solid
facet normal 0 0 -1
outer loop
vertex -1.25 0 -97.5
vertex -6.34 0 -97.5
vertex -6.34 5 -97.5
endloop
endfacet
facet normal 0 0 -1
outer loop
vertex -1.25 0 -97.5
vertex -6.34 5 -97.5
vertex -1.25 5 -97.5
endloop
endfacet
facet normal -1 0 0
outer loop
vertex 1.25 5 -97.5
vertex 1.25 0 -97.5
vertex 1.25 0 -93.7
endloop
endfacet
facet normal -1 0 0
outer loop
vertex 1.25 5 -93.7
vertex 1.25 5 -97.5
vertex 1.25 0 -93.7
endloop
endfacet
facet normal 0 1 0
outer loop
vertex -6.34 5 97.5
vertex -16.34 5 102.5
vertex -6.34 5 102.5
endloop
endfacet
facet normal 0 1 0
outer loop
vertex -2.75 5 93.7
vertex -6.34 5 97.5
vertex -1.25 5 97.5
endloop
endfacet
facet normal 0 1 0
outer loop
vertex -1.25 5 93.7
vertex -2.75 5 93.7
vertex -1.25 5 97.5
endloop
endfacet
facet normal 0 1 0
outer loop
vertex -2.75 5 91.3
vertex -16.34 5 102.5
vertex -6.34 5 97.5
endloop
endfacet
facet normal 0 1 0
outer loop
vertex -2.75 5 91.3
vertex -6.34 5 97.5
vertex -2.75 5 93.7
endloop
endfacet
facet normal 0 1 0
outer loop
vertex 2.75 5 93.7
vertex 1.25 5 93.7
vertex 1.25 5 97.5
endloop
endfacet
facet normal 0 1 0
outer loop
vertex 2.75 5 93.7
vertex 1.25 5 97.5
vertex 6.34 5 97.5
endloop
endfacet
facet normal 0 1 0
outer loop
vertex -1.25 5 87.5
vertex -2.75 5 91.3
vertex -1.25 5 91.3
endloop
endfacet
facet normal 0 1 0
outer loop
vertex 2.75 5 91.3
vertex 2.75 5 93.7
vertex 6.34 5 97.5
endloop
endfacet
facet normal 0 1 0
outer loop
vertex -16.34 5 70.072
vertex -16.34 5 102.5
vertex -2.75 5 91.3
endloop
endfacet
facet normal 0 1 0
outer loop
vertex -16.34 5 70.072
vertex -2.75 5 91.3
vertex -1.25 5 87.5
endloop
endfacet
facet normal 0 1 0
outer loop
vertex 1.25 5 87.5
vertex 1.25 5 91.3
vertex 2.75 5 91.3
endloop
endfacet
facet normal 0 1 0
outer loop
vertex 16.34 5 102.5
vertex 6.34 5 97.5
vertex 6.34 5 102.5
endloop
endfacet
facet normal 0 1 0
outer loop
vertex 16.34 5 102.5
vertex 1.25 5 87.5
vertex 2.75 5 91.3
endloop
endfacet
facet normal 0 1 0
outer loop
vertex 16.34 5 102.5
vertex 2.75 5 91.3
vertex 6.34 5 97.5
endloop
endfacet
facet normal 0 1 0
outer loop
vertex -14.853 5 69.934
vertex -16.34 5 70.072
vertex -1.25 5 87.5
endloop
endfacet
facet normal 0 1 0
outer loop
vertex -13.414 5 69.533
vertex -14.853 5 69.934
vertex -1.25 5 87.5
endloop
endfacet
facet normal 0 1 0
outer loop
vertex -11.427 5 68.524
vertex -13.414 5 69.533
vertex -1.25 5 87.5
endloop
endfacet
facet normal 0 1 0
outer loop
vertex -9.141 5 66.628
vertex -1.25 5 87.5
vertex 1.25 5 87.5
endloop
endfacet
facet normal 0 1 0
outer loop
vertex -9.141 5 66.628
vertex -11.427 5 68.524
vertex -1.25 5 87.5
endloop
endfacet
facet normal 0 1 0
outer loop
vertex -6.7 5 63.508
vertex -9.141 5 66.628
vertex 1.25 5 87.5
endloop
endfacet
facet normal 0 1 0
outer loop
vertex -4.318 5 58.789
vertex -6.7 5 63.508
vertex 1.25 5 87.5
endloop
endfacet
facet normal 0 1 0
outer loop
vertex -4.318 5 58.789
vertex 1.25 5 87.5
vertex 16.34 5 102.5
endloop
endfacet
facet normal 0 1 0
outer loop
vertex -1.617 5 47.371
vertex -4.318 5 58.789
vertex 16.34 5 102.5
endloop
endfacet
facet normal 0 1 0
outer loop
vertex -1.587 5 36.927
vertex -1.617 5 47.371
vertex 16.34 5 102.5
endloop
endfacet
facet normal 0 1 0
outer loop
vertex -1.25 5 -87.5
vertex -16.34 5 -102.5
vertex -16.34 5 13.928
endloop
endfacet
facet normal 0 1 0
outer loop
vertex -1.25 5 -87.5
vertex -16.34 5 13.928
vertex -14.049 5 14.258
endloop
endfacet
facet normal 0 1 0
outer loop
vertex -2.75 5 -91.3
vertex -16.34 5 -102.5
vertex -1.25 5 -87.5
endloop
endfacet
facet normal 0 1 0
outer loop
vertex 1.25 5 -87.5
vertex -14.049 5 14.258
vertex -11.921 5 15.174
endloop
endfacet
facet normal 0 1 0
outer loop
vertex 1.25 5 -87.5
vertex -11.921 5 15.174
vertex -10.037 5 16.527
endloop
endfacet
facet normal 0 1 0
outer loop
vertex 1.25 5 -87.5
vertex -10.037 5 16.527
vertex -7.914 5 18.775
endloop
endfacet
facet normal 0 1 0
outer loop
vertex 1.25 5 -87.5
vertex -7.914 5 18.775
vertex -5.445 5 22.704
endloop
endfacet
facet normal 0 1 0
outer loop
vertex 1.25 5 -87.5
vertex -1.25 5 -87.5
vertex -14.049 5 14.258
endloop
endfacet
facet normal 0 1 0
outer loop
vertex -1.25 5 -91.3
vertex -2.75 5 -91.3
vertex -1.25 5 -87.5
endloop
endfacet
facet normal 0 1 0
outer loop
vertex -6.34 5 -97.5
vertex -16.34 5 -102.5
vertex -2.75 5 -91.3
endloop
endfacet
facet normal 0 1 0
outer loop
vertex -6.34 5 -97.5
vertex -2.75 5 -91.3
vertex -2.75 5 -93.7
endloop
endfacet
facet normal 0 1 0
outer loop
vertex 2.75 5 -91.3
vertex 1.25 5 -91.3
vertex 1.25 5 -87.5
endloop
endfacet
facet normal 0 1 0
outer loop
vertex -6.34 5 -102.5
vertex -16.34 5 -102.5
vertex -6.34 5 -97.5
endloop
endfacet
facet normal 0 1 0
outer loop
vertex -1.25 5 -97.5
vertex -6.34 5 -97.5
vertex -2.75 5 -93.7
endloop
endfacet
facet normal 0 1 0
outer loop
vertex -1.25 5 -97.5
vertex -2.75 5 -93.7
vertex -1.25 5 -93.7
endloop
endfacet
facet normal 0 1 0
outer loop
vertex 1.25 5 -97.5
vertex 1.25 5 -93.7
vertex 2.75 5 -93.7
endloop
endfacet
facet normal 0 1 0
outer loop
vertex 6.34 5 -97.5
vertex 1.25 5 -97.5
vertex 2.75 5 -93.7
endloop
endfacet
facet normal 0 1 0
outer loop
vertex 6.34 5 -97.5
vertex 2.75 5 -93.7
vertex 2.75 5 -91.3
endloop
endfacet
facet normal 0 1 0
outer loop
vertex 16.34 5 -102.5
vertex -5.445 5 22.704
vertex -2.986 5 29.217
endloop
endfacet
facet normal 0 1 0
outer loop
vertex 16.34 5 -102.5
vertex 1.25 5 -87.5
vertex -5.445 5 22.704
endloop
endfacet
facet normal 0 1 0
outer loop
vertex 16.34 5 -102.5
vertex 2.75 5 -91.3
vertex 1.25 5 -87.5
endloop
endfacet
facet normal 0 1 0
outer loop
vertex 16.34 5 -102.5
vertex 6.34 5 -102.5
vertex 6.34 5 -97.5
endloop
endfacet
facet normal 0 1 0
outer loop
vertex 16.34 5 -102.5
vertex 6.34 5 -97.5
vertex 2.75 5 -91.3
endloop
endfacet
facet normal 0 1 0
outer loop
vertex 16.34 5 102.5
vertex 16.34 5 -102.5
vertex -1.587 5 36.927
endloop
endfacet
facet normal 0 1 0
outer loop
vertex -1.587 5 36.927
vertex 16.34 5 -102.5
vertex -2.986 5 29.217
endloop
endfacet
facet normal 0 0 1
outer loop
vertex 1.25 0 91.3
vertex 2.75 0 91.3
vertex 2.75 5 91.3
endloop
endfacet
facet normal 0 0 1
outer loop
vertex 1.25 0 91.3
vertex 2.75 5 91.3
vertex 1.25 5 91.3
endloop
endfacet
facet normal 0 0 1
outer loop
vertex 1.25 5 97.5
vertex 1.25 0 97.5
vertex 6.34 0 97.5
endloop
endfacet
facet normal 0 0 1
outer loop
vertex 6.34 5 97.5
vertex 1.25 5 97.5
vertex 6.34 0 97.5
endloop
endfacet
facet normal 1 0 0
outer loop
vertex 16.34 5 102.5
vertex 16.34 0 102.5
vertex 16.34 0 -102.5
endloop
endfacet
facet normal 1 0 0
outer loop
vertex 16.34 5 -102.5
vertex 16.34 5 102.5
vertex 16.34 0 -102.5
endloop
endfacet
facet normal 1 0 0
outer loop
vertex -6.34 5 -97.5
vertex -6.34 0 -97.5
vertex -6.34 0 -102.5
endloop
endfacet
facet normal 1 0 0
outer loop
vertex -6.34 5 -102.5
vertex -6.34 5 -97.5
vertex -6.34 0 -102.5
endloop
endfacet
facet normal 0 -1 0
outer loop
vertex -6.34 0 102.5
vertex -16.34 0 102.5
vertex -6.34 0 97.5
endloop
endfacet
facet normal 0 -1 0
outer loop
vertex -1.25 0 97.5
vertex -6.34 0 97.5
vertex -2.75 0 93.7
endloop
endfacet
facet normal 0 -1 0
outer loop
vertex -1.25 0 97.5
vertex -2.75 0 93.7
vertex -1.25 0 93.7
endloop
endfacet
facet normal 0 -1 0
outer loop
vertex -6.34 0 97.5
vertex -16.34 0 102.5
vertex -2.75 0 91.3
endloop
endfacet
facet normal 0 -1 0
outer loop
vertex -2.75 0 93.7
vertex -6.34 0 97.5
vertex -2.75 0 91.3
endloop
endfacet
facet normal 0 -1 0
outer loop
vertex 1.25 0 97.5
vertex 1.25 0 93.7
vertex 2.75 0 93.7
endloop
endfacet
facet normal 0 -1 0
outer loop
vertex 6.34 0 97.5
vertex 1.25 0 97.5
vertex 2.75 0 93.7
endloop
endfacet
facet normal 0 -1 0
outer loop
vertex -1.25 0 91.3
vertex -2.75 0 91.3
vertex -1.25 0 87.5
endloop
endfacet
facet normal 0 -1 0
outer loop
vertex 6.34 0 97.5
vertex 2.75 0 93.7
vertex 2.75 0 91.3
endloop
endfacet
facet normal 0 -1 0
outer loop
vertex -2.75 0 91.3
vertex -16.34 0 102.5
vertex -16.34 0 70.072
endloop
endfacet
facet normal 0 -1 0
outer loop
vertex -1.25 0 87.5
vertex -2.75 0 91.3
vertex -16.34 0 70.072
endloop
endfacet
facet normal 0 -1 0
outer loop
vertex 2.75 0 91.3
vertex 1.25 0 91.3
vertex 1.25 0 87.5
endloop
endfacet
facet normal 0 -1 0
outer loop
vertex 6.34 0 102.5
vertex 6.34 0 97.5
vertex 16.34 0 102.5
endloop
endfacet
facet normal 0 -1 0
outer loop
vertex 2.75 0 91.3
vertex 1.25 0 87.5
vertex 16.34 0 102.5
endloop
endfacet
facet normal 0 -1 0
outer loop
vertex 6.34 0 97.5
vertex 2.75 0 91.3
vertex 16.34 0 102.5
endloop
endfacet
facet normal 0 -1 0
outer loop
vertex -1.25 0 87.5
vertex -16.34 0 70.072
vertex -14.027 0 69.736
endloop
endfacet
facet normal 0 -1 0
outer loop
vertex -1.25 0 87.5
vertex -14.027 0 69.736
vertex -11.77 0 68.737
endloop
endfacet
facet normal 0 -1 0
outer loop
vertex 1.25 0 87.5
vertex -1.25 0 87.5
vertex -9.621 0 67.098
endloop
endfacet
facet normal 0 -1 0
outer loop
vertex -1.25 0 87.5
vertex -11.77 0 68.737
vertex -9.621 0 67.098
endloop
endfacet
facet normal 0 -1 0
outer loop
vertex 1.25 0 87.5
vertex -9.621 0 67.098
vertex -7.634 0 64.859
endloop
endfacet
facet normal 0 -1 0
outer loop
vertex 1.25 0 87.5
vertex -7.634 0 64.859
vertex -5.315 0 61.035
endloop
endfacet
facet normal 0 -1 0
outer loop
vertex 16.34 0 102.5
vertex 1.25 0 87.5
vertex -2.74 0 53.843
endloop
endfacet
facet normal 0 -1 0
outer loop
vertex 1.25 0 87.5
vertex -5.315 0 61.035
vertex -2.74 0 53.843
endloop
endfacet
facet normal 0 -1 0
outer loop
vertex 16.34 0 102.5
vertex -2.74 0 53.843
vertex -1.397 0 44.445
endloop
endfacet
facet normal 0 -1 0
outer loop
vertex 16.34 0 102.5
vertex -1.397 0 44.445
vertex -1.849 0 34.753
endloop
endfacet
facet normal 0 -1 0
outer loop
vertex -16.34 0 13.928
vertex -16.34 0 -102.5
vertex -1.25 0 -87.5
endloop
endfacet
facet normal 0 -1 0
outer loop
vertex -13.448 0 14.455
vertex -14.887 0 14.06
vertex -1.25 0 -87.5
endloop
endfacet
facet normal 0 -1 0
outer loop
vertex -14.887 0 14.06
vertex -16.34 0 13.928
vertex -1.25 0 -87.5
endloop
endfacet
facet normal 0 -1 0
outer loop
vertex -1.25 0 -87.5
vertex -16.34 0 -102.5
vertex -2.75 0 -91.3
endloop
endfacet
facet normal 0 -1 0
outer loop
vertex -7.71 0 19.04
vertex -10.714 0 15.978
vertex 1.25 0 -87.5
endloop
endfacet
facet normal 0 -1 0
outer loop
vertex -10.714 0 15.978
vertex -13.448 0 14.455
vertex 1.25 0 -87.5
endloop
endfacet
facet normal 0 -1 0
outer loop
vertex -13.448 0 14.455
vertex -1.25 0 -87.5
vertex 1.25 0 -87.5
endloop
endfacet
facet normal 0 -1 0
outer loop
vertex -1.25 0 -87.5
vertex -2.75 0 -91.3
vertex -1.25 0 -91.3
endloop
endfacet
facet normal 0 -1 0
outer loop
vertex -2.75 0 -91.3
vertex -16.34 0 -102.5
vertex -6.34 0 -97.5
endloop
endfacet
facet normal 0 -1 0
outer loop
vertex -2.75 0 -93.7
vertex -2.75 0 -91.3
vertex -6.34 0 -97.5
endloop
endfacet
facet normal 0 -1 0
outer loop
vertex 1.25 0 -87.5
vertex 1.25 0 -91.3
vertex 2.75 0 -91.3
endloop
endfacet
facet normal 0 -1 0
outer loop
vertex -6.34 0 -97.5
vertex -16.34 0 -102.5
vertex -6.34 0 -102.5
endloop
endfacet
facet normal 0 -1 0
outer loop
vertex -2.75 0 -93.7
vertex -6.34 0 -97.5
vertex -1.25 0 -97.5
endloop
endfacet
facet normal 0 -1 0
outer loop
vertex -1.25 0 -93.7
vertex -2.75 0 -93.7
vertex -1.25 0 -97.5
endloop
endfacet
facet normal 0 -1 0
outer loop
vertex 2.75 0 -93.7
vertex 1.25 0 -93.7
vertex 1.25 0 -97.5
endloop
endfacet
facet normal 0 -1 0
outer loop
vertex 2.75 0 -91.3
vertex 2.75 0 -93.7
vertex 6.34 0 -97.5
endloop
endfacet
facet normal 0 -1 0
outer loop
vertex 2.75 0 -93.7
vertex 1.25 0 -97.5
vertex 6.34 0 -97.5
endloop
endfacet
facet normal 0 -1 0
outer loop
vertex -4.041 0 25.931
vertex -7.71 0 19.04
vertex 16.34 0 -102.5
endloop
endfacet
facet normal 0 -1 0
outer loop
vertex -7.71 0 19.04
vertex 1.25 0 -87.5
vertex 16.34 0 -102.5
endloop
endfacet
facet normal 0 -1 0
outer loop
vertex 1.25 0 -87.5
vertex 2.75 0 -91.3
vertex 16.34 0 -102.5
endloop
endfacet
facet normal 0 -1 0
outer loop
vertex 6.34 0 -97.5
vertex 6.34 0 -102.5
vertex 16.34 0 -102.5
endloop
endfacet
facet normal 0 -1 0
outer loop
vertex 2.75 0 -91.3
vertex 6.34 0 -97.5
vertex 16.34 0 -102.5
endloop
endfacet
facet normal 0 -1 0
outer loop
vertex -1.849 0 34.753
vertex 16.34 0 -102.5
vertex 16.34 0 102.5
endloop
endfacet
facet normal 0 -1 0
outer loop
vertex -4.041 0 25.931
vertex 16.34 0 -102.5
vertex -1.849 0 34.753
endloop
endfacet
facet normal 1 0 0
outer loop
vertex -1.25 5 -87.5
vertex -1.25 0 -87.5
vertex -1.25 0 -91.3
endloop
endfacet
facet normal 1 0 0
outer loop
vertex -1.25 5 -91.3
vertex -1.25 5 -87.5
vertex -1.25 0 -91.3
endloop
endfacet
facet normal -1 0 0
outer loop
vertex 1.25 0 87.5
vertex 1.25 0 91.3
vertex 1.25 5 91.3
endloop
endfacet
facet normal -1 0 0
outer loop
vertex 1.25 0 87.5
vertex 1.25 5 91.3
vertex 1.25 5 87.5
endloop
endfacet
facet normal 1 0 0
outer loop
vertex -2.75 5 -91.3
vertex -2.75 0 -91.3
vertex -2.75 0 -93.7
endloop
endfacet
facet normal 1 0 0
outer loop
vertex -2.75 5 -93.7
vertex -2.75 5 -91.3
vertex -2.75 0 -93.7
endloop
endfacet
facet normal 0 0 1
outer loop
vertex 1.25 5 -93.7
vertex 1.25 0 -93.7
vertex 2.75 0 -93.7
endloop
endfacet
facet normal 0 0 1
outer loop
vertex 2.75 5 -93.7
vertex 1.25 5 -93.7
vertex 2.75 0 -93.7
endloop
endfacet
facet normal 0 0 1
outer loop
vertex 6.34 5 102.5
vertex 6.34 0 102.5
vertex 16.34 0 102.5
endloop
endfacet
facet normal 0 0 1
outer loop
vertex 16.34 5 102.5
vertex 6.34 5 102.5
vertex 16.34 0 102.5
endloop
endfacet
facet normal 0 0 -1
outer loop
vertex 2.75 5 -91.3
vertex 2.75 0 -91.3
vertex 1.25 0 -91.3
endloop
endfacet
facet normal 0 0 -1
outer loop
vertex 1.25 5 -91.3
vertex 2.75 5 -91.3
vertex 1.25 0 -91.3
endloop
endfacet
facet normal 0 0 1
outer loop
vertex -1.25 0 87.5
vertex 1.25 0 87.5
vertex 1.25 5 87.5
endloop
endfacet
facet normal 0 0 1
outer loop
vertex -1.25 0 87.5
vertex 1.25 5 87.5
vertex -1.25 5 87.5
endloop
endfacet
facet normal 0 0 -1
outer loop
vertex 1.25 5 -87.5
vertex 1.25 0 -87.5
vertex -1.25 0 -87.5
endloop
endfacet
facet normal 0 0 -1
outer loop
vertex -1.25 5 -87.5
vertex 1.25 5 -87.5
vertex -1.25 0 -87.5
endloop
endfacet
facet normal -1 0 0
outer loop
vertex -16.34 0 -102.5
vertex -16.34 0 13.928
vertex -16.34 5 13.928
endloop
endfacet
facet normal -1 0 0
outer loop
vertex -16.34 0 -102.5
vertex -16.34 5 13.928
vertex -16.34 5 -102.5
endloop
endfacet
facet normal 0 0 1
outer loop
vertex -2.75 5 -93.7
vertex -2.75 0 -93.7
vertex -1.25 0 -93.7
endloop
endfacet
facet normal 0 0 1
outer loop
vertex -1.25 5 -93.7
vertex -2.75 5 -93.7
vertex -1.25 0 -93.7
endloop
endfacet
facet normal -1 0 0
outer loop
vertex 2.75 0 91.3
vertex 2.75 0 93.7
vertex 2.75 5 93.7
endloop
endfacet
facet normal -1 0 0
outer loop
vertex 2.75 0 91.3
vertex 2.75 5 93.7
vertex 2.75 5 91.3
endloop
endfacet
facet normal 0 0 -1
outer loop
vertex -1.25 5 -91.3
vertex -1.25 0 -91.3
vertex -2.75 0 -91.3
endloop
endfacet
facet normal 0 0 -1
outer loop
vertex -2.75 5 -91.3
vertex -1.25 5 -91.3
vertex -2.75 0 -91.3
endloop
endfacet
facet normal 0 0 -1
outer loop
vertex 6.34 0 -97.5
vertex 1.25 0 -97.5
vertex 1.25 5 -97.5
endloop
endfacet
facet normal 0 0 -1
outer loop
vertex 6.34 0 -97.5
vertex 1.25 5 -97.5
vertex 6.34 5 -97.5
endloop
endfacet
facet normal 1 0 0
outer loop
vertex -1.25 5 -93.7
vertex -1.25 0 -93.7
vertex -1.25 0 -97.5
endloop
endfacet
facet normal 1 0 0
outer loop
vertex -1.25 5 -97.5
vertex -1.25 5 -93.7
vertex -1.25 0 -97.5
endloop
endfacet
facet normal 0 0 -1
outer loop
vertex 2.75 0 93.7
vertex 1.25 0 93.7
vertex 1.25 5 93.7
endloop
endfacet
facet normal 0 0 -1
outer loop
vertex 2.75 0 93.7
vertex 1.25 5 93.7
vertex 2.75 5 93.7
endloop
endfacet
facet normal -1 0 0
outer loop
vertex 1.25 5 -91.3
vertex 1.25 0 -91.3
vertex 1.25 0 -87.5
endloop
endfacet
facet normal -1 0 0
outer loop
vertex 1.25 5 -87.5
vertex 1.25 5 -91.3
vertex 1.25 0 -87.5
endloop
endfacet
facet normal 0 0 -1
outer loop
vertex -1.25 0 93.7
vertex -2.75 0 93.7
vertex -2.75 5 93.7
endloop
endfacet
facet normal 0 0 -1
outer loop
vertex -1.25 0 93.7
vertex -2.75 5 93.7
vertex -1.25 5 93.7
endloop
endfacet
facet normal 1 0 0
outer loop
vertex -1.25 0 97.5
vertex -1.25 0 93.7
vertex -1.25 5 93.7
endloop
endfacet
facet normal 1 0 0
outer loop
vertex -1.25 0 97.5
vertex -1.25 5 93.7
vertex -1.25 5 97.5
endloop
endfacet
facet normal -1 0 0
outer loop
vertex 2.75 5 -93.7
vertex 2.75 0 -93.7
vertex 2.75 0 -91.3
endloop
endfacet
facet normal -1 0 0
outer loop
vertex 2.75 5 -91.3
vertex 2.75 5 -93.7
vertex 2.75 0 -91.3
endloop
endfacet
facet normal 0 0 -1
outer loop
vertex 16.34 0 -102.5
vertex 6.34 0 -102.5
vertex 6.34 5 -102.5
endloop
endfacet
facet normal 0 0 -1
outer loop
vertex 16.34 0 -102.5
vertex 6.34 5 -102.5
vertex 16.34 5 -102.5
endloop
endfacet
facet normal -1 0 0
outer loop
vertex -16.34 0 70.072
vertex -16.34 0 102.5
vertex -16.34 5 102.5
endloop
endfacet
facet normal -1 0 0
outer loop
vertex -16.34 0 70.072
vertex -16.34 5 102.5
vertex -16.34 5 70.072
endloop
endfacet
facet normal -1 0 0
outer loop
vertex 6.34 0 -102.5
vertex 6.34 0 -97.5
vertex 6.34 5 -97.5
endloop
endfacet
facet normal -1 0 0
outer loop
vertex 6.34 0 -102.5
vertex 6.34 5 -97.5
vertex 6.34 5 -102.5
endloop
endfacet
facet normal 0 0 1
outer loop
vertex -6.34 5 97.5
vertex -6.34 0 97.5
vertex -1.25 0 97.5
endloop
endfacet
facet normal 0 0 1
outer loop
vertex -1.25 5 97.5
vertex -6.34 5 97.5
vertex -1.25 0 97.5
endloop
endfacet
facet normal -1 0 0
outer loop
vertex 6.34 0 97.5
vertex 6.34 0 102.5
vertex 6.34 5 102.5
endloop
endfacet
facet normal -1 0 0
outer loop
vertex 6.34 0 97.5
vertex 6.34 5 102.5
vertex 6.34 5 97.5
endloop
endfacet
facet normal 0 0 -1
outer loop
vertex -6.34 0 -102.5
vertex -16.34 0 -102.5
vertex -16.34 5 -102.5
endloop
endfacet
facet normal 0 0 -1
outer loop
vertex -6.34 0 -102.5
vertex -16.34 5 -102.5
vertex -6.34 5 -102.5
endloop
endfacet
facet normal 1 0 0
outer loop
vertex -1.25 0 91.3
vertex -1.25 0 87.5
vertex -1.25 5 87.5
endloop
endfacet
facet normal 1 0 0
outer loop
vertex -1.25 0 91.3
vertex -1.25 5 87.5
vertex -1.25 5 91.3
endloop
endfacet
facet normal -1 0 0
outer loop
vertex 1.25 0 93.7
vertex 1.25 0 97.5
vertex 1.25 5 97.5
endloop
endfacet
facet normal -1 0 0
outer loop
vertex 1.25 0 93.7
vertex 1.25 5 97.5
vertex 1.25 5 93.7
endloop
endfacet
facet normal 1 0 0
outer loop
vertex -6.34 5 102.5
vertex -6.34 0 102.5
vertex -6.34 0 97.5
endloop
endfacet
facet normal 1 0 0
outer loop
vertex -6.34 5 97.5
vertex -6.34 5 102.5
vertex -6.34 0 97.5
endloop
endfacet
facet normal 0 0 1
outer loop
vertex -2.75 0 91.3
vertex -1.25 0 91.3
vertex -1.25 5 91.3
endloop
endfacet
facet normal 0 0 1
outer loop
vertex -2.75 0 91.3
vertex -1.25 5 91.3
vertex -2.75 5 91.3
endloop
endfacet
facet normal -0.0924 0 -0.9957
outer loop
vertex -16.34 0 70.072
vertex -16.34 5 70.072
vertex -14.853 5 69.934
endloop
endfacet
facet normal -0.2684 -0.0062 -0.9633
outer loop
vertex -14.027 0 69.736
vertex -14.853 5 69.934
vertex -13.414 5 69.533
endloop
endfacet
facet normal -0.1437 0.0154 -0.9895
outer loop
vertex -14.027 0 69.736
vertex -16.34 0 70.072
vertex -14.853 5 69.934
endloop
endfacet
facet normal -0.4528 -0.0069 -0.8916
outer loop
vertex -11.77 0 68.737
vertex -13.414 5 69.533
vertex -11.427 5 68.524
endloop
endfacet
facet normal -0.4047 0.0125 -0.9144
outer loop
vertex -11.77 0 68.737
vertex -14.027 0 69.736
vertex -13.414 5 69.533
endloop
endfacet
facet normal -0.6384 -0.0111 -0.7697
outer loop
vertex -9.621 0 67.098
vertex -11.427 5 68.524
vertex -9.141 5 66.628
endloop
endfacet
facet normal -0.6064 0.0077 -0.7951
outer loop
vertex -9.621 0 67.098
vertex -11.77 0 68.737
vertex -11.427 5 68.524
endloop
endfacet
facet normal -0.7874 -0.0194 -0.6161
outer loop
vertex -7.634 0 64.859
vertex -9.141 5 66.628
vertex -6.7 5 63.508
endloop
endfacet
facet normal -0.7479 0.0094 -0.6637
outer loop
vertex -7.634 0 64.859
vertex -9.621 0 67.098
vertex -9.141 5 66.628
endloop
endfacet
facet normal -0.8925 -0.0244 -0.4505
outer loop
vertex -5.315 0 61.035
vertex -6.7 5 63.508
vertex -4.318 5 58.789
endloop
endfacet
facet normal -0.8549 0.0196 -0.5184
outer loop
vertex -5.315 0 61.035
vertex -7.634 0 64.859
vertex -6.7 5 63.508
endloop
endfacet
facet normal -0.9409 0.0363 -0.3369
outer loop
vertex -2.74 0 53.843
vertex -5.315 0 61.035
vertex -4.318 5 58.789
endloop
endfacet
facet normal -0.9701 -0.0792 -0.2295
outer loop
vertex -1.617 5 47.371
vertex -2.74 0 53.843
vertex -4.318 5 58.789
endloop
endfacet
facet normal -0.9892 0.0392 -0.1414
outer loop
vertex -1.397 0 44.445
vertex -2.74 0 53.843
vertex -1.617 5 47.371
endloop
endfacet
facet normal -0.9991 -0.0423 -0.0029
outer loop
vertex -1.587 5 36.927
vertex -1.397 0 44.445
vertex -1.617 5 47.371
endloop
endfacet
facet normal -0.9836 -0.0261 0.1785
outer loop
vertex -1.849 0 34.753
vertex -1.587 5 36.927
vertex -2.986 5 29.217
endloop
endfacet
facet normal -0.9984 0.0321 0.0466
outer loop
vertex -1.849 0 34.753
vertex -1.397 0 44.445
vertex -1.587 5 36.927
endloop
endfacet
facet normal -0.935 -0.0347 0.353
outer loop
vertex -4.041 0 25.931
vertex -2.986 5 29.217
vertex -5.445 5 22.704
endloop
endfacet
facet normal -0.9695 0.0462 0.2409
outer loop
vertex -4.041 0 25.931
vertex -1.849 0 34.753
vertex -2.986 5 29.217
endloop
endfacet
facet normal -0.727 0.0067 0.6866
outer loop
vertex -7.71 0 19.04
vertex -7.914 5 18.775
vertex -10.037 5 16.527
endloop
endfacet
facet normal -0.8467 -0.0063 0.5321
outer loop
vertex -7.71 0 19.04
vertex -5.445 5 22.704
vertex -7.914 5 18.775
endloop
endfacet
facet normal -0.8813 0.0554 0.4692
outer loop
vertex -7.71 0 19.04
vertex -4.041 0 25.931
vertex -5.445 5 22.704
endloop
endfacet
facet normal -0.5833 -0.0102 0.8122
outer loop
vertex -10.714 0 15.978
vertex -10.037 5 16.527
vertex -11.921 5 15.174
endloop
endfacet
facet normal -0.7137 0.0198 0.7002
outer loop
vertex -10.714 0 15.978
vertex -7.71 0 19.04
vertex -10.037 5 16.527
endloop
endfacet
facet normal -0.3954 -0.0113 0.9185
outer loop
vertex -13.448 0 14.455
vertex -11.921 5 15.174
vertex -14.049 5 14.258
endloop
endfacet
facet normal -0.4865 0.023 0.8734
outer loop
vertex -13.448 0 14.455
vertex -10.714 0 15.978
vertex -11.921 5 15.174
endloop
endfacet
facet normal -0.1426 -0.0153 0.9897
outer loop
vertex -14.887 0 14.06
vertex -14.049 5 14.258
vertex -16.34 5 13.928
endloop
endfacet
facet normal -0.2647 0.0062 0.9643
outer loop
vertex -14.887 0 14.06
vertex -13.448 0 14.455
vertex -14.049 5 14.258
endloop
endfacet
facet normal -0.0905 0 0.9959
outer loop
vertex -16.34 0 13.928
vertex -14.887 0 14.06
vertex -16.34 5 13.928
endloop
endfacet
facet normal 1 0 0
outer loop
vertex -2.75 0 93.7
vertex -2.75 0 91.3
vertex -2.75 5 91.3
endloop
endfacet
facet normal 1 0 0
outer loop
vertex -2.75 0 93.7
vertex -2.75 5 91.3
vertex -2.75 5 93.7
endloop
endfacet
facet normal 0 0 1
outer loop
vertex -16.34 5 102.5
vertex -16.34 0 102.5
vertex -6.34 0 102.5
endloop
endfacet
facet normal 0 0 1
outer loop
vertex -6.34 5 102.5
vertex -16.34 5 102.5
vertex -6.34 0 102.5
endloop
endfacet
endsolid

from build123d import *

# Parameters (mm, degrees)
SCHIZZO1_W                   = 32.68
SCHIZZO1_H                   = 205
ESTRUSIONE_ESTRUSIONE1_DEPTH = 5
SCHIZZO3_W                   = 12.68
SCHIZZO3_H                   = 5
TAGLIO_ESTRUSIONE1_DEPTH     = 6
TAGLIO_ESTRUSIONE2_DEPTH     = 6
SCHIZZO5_RX                  = 28.071854537
SCHIZZO5_RY                  = 15
TAGLIO_ESTRUSIONE3_DEPTH     = 6


with BuildPart() as part:
    # Schizzo1 → Estrusione-Estrusione1 (new body)
    with BuildSketch(Plane(origin=(0, 0, 0), x_dir=(1, 0, 0), z_dir=(0, 1, 0))):
        Rectangle(SCHIZZO1_W, SCHIZZO1_H)
    extrude(amount=ESTRUSIONE_ESTRUSIONE1_DEPTH)

    # Schizzo3 → Taglio-Estrusione1 (cut, through all)
    with BuildSketch(Plane(origin=(0, 0, 0), x_dir=(1, 0, 0), z_dir=(0, 1, 0))):
        with Locations((0, 100)):
            Rectangle(SCHIZZO3_W, SCHIZZO3_H)
        with Locations((0, -100)):
            Rectangle(SCHIZZO3_W, SCHIZZO3_H)
    extrude(amount=TAGLIO_ESTRUSIONE1_DEPTH, mode=Mode.SUBTRACT)

    # Schizzo4 → Taglio-Estrusione2 (cut, through all)
    with BuildSketch(Plane(origin=(0, 0, 0), x_dir=(1, 0, 0), z_dir=(0, 1, 0))):
        Polygon((-1.25, 87.5), (-1.25, 91.3), (-2.75, 91.3), (-2.75, 93.7), (-1.25, 93.7), (-1.25, 97.5), (1.25, 97.5), (1.25, 93.7), (2.75, 93.7), (2.75, 91.3), (1.25, 91.3), (1.25, 87.5), align=None)
        Polygon((2.75, -91.3), (1.25, -91.3), (1.25, -87.5), (-1.25, -87.5), (-1.25, -91.3), (-2.75, -91.3), (-2.75, -93.7), (-1.25, -93.7), (-1.25, -97.5), (1.25, -97.5), (1.25, -93.7), (2.75, -93.7), align=None)
    extrude(amount=TAGLIO_ESTRUSIONE2_DEPTH, mode=Mode.SUBTRACT)

    # Schizzo5 → Taglio-Estrusione3 (cut, through all)
    with BuildSketch(Plane(origin=(0, 0, 0), x_dir=(1, 0, 0), z_dir=(0, 1, 0))):
        with Locations(Location((-16.34, -42), (0, 0, 90))):
            Ellipse(SCHIZZO5_RX, SCHIZZO5_RY)
    extrude(amount=TAGLIO_ESTRUSIONE3_DEPTH, mode=Mode.SUBTRACT)


solid = part.part
